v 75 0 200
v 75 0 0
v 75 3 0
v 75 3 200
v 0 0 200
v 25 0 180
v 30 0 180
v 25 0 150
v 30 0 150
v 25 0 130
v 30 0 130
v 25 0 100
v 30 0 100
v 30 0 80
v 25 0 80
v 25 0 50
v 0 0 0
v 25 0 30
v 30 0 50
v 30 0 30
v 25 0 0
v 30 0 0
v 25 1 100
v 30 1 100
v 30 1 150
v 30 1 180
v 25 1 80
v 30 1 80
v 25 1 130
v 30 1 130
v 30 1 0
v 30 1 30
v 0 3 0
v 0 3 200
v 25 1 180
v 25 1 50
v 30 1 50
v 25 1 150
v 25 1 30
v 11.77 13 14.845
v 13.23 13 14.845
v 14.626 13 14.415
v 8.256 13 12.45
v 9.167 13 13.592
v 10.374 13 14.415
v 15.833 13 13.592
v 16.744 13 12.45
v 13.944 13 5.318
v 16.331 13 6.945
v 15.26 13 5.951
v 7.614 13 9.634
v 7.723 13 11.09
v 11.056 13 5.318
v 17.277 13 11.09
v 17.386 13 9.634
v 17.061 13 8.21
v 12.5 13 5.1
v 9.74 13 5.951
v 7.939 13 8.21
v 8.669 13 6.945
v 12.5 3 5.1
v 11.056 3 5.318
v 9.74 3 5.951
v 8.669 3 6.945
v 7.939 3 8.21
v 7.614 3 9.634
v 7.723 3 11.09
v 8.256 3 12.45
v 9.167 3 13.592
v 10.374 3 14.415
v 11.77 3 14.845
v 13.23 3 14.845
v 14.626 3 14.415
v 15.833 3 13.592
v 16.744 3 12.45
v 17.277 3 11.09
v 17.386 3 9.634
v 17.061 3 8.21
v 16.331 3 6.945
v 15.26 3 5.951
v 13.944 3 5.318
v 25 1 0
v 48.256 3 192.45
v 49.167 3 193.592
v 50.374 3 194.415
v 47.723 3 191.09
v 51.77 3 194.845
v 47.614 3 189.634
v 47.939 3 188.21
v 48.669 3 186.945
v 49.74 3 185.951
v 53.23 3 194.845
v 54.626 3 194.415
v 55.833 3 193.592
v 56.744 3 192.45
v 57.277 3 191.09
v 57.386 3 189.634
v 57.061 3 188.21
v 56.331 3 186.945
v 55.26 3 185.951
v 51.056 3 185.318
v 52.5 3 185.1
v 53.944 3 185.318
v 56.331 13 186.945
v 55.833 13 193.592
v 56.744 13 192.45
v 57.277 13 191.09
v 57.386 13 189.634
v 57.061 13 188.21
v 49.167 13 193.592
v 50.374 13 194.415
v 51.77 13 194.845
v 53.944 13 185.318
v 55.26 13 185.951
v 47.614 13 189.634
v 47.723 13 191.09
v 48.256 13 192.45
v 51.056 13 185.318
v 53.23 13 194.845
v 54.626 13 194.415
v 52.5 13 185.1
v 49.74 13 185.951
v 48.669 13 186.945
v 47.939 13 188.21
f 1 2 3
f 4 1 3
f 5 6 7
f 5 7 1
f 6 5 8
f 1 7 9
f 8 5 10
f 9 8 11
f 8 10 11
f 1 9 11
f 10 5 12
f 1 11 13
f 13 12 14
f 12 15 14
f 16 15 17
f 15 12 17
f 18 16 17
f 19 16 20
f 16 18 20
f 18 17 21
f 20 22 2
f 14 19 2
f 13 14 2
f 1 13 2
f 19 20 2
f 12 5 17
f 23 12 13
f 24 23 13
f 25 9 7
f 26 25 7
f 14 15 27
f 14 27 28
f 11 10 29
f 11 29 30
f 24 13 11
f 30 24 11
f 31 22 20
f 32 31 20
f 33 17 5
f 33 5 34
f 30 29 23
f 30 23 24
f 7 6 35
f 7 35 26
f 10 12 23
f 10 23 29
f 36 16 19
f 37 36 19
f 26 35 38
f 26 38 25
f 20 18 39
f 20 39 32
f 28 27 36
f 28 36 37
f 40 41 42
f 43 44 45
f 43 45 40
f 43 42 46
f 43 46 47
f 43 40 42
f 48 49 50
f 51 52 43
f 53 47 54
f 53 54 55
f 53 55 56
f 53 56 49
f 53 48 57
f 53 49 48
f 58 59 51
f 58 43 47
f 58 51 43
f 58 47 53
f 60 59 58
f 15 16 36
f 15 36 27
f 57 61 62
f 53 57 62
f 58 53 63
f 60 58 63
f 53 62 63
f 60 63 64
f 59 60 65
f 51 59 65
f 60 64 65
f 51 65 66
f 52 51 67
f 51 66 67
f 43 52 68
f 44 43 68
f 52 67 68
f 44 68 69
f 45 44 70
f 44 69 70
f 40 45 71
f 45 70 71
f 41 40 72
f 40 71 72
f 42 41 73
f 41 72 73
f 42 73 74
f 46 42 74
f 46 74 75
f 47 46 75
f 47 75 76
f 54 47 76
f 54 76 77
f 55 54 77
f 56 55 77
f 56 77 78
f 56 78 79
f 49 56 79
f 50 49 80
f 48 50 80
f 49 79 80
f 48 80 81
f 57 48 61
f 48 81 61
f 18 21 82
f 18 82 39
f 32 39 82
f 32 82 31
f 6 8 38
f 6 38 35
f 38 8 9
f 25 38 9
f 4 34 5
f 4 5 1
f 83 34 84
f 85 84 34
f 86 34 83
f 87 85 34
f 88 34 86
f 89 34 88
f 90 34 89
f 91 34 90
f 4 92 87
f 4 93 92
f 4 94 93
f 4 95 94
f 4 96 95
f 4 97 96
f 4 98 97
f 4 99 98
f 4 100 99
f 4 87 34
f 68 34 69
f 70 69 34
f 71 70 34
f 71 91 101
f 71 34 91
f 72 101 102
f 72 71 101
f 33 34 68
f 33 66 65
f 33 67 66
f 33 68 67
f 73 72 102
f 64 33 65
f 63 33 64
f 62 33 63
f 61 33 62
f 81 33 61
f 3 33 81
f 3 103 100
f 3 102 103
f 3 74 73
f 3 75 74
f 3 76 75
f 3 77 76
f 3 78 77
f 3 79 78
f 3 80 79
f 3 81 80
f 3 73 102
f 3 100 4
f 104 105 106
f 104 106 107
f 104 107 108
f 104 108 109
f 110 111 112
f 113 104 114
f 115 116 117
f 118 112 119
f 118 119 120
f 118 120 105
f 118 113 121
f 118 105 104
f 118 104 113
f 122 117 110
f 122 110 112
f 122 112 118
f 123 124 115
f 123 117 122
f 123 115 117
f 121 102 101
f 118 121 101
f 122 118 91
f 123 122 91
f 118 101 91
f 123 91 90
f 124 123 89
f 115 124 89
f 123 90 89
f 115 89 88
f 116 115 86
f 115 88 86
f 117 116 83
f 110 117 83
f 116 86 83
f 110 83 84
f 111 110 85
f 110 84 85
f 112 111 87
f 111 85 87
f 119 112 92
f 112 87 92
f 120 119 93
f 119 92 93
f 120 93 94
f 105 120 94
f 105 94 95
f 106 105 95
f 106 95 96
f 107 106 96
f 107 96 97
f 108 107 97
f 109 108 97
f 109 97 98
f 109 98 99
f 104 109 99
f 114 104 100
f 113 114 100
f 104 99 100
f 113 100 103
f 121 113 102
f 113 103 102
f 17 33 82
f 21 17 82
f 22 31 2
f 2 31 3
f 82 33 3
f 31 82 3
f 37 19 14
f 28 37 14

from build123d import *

# Parameters (mm, degrees)
SKETCH1_W           = 75
SKETCH1_H           = 3
BOSS_EXTRUDE1_DEPTH = 200
SKETCH2_R           = 4.9
BOSS_EXTRUDE2_DEPTH = 10
SKETCH3_W           = 5
SKETCH3_H           = 30
CUT_EXTRUDE1_DEPTH  = 1


with BuildPart() as part:
    # Sketch1 → Boss-Extrude1 (new body)
    with BuildSketch(Plane.XY):
        with Locations((37.5, 1.5)):
            Rectangle(SKETCH1_W, SKETCH1_H)
    extrude(amount=BOSS_EXTRUDE1_DEPTH)

    # Sketch2 → Boss-Extrude2 (add)
    with BuildSketch(Plane(origin=(0, 3, 0), x_dir=(1, 0, 0), z_dir=(0, 1, 0))):
        with Locations(Location((12.5, -10, 0), (0, 0, 90))):
            Circle(SKETCH2_R)
        with Locations(Location((52.5, -190, 0), (0, 0, 90))):
            Circle(SKETCH2_R)
    extrude(amount=BOSS_EXTRUDE2_DEPTH)

    # Sketch3 → Cut-Extrude1 (cut)
    with BuildSketch(Plane.XZ):
        with Locations((27.5, 165)):
            Rectangle(SKETCH3_W, SKETCH3_H)
        with Locations((27.5, 115)):
            Rectangle(SKETCH3_W, SKETCH3_H)
        with Locations((27.5, 65)):
            Rectangle(SKETCH3_W, SKETCH3_H)
        with Locations((27.5, 15)):
            Rectangle(SKETCH3_W, SKETCH3_H)
    extrude(amount=-CUT_EXTRUDE1_DEPTH, mode=Mode.SUBTRACT)


solid = part.part
